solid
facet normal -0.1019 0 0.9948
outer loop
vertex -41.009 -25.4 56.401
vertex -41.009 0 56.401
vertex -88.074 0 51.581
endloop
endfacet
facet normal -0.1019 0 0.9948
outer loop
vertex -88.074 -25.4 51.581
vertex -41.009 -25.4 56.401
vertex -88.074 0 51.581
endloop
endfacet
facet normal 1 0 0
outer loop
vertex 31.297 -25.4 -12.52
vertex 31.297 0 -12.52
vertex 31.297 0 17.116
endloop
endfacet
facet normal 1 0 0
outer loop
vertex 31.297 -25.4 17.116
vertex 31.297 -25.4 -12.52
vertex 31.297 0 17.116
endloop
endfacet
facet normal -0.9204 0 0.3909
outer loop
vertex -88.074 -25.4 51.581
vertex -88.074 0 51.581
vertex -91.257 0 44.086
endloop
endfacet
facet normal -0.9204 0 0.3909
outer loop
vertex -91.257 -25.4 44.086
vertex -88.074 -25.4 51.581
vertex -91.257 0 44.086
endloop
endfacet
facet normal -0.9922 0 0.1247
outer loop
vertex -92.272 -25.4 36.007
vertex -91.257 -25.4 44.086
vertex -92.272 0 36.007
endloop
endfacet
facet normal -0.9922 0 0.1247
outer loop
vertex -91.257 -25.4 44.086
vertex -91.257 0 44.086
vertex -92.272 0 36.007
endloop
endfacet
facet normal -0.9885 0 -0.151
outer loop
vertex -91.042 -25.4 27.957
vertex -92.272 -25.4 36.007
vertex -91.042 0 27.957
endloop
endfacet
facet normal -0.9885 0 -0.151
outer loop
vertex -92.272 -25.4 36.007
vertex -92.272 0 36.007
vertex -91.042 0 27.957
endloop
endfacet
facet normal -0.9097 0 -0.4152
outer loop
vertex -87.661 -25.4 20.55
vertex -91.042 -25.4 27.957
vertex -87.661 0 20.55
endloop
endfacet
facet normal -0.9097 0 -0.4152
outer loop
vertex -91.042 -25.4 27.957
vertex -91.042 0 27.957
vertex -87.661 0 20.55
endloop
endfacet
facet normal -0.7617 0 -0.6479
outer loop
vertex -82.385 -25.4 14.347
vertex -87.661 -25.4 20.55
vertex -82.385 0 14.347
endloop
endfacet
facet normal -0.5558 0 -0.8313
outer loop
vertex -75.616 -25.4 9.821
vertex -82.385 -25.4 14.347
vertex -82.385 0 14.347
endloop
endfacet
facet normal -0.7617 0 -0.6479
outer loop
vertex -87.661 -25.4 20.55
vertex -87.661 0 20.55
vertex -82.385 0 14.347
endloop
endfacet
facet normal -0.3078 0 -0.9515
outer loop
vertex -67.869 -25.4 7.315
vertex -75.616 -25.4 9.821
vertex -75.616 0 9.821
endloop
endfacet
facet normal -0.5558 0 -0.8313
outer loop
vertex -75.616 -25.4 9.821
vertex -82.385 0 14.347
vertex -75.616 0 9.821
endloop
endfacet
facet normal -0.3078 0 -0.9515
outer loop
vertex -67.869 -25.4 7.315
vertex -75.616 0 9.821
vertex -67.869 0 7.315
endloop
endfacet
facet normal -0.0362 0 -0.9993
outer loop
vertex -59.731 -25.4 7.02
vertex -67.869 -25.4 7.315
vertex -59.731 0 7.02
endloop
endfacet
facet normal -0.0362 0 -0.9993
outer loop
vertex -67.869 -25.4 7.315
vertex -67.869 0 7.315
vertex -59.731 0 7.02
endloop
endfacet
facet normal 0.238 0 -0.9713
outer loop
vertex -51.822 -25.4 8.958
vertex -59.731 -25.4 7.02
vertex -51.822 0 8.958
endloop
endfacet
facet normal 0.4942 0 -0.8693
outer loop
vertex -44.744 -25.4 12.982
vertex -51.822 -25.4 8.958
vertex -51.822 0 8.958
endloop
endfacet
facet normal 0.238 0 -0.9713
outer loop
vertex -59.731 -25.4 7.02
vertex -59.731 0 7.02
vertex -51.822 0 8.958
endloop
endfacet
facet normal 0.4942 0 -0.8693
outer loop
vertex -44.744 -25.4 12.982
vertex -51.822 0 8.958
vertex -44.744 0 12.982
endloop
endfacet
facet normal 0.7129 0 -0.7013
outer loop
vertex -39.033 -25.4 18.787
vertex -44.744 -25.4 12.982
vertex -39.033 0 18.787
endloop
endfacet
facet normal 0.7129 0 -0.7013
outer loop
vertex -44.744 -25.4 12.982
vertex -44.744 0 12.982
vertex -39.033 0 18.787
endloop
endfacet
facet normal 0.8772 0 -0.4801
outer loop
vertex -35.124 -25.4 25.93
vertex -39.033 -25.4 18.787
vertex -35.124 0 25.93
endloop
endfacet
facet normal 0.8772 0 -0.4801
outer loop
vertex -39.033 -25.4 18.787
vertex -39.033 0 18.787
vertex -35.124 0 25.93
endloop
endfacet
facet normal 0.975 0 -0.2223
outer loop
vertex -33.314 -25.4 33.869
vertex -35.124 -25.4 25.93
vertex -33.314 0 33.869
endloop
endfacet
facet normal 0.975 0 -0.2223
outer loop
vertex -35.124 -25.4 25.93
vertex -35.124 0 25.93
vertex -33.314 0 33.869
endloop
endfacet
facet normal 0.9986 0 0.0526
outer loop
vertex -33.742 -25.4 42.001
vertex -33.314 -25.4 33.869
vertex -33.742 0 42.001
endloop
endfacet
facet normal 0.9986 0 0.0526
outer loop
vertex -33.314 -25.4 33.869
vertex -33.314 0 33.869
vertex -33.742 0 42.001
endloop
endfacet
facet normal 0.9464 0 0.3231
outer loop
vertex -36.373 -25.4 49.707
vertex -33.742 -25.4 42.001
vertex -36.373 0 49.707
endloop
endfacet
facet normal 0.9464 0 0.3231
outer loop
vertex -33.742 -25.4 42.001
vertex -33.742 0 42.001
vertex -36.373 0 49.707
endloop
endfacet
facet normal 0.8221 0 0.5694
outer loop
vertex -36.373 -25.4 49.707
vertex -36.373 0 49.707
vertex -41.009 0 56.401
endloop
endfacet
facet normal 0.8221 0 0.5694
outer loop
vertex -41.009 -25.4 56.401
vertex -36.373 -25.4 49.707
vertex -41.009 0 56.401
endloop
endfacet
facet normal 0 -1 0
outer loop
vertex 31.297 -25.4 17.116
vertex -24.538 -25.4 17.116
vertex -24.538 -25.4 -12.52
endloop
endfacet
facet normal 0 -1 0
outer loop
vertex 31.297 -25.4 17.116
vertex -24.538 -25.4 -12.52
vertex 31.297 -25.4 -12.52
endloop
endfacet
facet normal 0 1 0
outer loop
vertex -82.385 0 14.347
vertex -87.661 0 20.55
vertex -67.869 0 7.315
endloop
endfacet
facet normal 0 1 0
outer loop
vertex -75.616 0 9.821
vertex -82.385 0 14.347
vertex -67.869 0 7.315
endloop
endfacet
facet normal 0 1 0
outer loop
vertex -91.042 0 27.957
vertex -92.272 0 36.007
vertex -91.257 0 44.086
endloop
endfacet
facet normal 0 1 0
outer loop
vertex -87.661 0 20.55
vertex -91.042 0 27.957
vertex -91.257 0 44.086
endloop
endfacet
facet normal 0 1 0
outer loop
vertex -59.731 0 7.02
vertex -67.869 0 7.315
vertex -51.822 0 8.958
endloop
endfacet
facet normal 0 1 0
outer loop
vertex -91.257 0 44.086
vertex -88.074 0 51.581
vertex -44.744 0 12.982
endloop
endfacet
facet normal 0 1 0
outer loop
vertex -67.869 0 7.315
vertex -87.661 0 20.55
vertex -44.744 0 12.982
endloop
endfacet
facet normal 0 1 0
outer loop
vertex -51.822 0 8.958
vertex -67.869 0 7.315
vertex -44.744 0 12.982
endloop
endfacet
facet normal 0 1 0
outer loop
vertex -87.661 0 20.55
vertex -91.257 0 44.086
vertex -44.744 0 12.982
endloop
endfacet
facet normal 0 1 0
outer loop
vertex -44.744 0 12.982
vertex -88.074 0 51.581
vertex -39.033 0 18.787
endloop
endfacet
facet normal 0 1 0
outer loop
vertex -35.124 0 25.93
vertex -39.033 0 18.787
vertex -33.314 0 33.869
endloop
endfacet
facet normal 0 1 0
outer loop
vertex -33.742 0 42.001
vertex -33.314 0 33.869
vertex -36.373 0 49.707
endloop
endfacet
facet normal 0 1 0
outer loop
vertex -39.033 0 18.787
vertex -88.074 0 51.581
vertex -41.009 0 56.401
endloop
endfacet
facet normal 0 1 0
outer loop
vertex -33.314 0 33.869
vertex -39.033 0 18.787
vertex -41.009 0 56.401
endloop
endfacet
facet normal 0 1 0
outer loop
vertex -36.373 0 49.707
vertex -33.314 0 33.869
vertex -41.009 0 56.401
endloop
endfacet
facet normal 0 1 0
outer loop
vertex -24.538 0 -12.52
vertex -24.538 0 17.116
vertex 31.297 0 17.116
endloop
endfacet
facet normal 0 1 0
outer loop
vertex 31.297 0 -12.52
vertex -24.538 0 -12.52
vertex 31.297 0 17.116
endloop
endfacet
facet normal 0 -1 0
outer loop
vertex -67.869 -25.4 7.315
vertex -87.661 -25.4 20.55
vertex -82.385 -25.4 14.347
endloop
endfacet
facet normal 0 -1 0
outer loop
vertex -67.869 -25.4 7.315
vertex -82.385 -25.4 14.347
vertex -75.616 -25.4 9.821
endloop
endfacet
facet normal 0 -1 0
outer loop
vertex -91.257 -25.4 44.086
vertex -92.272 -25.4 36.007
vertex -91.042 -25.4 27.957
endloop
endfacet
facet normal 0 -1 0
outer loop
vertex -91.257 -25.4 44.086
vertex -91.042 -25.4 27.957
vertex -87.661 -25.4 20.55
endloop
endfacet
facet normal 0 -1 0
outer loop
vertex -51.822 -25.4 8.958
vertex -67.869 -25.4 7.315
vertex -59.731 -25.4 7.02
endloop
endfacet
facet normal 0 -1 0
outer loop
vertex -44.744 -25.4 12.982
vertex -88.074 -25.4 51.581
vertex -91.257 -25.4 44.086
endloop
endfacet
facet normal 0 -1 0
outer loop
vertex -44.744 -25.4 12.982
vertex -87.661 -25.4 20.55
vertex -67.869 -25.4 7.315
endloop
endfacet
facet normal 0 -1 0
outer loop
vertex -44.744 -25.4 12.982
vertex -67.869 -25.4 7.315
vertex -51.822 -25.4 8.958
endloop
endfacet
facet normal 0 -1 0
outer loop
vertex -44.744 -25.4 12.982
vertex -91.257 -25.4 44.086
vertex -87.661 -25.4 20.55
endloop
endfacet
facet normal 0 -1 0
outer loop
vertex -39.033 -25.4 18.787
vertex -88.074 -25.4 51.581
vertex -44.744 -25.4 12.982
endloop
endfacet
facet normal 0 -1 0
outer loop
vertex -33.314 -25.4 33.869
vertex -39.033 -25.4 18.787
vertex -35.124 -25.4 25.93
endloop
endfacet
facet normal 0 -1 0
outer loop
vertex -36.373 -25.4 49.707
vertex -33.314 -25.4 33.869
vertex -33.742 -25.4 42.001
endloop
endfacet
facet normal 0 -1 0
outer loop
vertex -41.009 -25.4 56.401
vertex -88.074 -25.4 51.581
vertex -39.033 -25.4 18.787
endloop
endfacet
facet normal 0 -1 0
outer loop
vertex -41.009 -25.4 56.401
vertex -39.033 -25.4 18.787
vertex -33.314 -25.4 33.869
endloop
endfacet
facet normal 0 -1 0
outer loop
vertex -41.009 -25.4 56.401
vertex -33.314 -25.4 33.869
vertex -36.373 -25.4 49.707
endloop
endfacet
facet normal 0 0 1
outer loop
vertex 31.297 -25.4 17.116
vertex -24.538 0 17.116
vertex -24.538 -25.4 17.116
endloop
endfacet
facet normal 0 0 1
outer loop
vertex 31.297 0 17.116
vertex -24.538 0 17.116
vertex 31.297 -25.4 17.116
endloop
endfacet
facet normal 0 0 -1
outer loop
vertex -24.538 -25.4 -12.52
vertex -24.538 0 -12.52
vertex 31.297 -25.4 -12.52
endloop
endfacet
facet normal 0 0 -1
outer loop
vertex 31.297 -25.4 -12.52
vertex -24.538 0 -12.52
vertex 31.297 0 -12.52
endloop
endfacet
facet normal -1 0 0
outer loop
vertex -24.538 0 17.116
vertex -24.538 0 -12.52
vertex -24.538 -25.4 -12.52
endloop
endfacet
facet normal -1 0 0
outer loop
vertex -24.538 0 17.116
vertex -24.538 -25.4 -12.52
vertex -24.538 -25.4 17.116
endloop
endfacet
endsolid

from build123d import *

# Parameters (mm, degrees)
F0_W     = 55.834214
F0_H     = 29.635703
F1_DEPTH = 25.4


with BuildPart() as f1:
    # F0 (on Front) → F1 (new body)
    with BuildSketch(Plane.XZ):
        with BuildLine():
            Line((-41.008829, 56.400996), (-88.0741, 51.58112))
            ThreePointArc((-88.0741, 51.58112), (-59.731212, 7.019752), (-41.008829, 56.400996))
        make_face()
        with Locations((3.379441, 2.297951)):
            Rectangle(F0_W, F0_H)
    extrude(amount=F1_DEPTH)


solid = f1.part
